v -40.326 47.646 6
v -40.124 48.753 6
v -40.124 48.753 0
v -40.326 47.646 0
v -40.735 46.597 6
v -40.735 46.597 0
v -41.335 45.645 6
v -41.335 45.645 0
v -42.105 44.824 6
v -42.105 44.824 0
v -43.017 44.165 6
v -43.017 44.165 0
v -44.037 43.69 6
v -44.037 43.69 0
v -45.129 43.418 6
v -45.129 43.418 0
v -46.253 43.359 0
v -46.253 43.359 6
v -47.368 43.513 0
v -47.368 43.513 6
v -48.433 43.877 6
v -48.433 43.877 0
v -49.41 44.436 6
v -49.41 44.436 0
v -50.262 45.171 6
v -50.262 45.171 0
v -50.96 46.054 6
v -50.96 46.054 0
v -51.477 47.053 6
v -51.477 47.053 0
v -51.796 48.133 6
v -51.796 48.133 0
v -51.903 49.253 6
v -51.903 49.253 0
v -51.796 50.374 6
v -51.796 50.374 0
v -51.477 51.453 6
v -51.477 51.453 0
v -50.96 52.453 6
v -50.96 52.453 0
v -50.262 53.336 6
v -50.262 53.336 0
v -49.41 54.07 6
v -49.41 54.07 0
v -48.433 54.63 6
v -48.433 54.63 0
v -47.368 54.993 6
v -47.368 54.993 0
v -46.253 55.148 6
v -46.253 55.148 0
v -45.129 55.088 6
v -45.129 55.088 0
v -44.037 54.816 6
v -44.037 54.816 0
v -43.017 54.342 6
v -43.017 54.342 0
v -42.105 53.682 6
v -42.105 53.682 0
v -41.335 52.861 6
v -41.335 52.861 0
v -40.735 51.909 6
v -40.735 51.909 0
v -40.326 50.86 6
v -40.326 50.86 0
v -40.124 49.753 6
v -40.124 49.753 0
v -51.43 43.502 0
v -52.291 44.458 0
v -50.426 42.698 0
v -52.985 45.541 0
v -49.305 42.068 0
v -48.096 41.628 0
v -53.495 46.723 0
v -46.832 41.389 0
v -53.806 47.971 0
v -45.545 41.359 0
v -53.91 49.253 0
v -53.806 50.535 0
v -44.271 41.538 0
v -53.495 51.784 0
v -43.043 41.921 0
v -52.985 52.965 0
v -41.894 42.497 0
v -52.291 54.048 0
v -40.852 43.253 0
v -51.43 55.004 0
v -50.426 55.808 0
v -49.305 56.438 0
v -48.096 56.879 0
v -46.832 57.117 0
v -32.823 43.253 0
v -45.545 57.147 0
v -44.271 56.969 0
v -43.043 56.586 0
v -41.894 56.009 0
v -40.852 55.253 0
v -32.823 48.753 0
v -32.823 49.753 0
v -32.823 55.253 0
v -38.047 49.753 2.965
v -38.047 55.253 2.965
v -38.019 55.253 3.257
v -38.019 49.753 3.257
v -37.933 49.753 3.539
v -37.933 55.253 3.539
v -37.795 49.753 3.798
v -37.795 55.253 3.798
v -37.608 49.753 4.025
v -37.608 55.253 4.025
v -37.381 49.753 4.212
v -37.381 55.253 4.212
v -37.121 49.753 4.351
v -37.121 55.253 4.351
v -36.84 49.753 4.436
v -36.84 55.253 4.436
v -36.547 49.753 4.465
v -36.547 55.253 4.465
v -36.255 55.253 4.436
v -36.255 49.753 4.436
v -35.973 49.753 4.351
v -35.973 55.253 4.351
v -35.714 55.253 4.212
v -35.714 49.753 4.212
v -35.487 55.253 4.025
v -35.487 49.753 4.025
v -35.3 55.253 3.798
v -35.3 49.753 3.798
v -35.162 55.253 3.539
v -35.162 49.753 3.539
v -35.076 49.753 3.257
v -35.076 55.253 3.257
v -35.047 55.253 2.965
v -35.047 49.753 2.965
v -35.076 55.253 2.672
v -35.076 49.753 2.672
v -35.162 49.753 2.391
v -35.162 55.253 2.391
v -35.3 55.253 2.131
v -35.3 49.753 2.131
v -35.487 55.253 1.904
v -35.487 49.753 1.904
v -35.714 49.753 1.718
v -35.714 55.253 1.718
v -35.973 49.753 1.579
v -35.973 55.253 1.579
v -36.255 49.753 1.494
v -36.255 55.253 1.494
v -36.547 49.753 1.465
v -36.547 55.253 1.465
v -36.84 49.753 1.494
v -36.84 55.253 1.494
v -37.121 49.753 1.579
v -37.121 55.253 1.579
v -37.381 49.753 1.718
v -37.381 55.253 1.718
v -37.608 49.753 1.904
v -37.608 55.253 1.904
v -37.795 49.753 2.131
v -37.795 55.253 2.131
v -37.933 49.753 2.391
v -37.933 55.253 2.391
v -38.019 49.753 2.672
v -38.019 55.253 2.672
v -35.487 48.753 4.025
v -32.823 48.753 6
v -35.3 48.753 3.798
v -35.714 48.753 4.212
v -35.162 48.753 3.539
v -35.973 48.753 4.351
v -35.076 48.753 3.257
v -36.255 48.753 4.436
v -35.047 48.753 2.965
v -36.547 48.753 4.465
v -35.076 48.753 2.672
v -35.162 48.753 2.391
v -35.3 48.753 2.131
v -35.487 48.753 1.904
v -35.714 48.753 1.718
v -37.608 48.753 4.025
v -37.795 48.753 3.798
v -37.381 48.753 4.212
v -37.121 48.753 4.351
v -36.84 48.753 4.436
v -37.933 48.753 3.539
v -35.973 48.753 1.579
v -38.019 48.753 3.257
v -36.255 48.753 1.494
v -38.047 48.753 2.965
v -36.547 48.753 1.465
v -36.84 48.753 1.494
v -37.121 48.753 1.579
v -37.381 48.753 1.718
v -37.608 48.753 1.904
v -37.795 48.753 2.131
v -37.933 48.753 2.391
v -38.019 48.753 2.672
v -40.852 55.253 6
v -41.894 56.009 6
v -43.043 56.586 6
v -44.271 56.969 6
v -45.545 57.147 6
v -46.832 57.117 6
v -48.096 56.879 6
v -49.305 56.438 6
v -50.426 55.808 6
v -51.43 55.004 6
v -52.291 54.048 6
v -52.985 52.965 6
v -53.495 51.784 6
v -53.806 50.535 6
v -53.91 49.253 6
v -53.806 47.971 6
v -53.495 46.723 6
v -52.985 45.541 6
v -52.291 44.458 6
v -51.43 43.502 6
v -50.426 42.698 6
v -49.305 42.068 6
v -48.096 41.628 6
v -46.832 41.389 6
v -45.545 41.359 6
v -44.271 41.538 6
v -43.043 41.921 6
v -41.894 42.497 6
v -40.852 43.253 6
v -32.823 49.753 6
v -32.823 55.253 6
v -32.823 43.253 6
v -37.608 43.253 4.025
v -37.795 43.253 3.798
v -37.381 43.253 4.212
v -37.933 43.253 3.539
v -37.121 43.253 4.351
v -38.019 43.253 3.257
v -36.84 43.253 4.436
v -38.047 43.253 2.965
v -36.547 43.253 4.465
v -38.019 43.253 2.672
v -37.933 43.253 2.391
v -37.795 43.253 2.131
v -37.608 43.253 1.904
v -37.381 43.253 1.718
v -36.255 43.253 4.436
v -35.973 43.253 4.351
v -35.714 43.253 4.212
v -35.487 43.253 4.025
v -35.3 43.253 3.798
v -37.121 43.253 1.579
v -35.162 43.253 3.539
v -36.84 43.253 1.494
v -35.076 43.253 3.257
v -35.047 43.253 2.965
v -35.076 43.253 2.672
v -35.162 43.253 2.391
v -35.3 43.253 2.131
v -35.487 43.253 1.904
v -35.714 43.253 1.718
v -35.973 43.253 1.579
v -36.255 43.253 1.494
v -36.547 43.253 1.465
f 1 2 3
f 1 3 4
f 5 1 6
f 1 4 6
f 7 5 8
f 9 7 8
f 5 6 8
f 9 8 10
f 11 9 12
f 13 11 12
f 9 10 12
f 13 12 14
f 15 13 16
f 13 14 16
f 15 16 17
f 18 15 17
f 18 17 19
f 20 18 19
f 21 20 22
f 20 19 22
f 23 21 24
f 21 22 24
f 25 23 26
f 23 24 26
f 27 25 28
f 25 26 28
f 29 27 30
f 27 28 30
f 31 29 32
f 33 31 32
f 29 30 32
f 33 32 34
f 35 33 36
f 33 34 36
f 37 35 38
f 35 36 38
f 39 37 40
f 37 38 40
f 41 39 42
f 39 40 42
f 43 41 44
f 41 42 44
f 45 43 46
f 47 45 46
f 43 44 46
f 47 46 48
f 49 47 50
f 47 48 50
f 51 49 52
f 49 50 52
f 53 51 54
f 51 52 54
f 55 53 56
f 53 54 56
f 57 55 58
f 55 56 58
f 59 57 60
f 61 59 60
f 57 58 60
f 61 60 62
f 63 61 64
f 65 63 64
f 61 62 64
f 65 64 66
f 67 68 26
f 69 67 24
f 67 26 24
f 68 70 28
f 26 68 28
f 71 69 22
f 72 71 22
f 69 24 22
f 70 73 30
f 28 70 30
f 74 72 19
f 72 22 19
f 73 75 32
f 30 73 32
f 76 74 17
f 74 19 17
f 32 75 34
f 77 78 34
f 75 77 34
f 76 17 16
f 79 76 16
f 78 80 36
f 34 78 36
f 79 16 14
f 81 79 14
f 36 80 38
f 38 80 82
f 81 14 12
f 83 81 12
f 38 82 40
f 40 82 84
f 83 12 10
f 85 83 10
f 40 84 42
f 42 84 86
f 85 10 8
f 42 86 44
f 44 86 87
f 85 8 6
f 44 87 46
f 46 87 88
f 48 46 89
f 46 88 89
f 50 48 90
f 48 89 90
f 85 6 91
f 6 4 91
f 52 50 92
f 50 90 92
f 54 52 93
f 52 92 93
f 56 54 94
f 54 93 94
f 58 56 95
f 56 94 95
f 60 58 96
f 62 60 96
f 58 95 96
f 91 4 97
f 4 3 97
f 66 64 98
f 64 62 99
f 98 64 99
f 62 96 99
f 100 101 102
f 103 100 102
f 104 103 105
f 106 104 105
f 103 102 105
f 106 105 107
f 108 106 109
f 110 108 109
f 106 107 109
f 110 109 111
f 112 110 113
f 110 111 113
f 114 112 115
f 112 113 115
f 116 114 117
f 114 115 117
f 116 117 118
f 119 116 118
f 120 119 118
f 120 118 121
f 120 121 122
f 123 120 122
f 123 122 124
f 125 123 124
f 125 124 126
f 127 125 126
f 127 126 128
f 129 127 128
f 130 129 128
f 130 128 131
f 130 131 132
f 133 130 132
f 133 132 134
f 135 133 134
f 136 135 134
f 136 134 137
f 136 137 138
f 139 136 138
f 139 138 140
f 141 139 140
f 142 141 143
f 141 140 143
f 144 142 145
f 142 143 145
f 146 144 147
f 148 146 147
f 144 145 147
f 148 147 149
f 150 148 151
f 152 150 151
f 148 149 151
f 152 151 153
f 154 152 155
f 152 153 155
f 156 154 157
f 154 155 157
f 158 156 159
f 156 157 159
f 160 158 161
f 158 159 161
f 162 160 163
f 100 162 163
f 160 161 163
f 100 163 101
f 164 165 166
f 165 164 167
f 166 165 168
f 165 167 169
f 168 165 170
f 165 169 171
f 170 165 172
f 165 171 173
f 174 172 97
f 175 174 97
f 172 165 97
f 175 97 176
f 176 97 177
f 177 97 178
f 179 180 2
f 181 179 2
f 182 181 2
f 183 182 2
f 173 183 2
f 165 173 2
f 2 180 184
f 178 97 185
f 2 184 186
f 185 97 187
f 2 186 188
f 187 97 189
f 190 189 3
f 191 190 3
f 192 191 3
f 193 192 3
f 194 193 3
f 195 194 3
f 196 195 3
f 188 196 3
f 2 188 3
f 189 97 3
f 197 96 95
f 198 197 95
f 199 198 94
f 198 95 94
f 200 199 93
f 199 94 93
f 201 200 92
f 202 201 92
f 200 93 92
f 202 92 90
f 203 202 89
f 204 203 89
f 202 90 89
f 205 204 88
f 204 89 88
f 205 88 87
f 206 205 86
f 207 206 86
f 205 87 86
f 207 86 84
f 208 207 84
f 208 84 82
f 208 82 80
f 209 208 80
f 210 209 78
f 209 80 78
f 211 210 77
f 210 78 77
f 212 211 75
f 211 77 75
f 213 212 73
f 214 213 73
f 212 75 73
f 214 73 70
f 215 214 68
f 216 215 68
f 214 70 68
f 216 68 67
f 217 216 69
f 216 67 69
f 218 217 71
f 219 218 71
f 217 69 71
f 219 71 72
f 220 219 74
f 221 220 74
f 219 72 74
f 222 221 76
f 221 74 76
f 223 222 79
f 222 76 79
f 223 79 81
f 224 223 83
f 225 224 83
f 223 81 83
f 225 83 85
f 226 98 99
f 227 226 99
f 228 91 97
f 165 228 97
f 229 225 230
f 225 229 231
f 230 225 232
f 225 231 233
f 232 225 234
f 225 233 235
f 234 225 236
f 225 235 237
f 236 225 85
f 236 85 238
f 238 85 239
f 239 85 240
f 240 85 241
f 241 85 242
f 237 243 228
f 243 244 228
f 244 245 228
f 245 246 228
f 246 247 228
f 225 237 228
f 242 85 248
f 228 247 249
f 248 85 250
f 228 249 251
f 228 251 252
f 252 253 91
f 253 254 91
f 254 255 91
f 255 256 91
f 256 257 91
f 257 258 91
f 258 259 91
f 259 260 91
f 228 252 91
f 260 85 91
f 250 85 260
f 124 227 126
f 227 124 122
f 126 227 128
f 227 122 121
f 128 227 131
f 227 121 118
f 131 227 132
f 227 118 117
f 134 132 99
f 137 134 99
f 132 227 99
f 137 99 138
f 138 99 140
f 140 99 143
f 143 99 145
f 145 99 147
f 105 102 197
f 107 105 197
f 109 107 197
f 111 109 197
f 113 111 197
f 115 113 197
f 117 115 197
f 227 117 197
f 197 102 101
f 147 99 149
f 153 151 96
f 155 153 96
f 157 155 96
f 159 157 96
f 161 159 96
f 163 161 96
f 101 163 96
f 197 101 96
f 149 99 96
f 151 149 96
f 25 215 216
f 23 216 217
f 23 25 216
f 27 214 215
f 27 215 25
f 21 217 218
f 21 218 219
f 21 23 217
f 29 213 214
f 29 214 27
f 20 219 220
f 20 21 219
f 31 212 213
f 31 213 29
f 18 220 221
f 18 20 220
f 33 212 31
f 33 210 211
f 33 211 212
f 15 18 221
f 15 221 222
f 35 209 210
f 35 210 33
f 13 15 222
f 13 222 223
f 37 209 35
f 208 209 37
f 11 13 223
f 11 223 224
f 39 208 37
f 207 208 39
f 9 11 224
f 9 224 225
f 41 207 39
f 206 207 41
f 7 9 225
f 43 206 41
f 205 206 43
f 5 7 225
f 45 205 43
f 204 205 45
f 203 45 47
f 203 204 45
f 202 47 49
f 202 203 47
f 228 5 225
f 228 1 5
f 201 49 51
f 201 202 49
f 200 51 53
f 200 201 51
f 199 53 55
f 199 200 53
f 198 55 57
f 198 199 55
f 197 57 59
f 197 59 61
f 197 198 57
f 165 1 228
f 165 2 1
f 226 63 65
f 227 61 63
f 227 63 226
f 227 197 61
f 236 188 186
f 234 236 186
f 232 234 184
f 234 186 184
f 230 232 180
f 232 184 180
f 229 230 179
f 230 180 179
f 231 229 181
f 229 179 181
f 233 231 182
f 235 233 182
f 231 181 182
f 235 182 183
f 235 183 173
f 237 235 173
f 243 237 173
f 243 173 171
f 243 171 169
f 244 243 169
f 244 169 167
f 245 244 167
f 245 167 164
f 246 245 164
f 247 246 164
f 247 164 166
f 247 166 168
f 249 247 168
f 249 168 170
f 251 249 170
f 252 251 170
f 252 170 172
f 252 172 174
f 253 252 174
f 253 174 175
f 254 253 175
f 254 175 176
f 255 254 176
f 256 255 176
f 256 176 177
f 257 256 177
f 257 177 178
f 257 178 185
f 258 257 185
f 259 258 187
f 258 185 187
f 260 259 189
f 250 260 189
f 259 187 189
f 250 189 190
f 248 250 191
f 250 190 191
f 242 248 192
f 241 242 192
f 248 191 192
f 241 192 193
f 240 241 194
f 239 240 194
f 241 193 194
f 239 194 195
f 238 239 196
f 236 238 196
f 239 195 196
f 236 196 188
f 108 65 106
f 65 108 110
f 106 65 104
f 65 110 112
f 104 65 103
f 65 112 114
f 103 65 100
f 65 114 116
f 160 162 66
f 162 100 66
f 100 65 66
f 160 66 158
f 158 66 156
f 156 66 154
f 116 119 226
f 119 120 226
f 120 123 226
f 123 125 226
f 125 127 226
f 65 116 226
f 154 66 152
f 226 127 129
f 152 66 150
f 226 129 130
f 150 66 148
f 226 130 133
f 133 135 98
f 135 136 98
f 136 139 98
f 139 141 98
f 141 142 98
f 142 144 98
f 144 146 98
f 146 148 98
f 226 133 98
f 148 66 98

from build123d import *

# Parameters (mm, degrees)
BOSS_EXTRUDE1_DEPTH = 6
SKETCH2_R           = 1.5
CUT_EXTRUDE1_DEPTH  = 14


with BuildPart() as part:
    # Sketch1 → Boss-Extrude1 (new body)
    with BuildSketch(Plane.XY):
        with BuildLine():
            Line((-32.822846092, 55.253207469), (-40.85246604, 55.253207469))
            ThreePointArc((-40.85246604, 55.253207469), (-53.910402863, 49.253207469), (-40.85246604, 43.253207469))
            Line((-40.85246604, 43.253207469), (-32.822846092, 43.253207469))
            Line((-32.822846092, 43.253207469), (-32.822846092, 48.753207469))
            Line((-32.822846092, 48.753207469), (-38.111345814, 48.753207469))
            Line((-38.111345814, 48.753207469), (-40.124187091, 48.753207469))
            ThreePointArc((-40.124187091, 48.753207469), (-51.902962473, 49.253207469), (-40.124187091, 49.753207469))
            Line((-40.124187091, 49.753207469), (-38.111345814, 49.753207469))
            Line((-38.111345814, 49.753207469), (-32.822846092, 49.753207469))
            Line((-32.822846092, 49.753207469), (-32.822846092, 55.253207469))
        make_face()
    extrude(amount=BOSS_EXTRUDE1_DEPTH)

    # Sketch2 → Cut-Extrude1 (cut)
    with BuildSketch(Plane(origin=(0, 55.253207469, 0), x_dir=(1, 0, 0), z_dir=(0, 1, 0))):
        with Locations(Location((-36.547451728, -2.96481335, 0), (0, 0, 180))):
            Circle(SKETCH2_R)
    extrude(amount=-CUT_EXTRUDE1_DEPTH, mode=Mode.SUBTRACT)


solid = part.part
